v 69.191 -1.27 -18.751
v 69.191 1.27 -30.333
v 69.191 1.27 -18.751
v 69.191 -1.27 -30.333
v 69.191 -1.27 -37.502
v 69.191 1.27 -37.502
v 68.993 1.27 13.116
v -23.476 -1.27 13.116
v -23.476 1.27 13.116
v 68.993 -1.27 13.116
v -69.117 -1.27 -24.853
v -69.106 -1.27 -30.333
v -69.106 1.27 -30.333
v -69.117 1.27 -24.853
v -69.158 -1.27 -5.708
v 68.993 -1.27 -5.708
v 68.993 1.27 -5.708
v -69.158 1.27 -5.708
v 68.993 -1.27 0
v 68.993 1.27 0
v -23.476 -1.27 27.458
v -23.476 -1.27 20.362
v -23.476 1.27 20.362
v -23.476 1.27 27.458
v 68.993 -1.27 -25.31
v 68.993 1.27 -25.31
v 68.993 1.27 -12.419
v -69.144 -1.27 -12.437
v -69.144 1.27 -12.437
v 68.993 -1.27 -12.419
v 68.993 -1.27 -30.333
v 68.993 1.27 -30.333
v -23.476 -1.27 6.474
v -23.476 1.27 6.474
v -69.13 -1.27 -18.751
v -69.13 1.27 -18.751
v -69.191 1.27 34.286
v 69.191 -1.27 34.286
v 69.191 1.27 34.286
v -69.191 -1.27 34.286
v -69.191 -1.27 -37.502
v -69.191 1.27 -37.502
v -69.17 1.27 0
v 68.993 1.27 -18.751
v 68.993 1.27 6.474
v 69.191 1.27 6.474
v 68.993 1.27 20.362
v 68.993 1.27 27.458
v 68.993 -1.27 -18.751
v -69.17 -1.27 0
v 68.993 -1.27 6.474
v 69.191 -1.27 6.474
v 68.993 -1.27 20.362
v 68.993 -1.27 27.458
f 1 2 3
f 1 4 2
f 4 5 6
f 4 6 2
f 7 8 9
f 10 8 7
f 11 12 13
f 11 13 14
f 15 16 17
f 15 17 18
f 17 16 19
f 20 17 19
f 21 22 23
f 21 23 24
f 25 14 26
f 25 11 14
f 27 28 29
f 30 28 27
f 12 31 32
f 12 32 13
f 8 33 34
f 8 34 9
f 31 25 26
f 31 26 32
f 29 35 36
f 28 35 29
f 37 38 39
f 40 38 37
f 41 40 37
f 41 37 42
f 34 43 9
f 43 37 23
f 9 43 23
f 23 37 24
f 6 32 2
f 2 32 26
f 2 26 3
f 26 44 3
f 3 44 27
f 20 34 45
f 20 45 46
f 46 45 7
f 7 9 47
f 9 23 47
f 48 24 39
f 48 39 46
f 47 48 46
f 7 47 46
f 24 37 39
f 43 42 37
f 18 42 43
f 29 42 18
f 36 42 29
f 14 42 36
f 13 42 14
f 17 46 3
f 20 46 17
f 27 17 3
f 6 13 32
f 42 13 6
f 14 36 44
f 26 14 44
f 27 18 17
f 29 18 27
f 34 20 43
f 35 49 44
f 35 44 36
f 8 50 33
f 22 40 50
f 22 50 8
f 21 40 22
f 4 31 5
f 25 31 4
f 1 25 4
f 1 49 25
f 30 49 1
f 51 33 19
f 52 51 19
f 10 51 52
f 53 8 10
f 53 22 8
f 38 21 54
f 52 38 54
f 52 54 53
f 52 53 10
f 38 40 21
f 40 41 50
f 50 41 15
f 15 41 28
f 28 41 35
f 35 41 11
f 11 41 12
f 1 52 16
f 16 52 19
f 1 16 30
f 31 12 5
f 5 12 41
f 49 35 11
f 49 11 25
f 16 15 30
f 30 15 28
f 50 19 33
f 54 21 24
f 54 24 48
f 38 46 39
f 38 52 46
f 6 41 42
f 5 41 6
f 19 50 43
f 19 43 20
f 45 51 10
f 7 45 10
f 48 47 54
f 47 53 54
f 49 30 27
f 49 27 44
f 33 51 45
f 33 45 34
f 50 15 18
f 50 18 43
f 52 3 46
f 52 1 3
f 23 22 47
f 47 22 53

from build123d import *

# Parameters (mm, degrees)
F0_W     = 0.1980072791
F0_H     = 7.1694856525
F0_W_2   = 92.4687646329
F0_H_2   = 6.8283765789
F0_H_3   = 6.473645713
F0_H_4   = 5.7075782395
F0_H_5   = 7.0958843866
F0_H_6   = 7.2461878881
F0_H_7   = 6.6423406824
F1_DEPTH = 1.27


# Not quite as in the source:
# - a feature names something its author has since deleted; it is built from what else it names


with BuildPart() as f1:
    # F0 (on Front) → F1 (new body, symmetric)
    with BuildSketch(Plane.XZ):
        Polygon((-69.1910094554, 0), (-69.1910094554, -37.5021121278), (-69.0906792879, -37.5021121278), (-69.1058018093, -30.3326264753), (-69.1173589099, -24.8534827961), (-69.130230695, -18.7510560639), (-69.1435495608, -12.4366714017), (-69.1577431668, -5.7075782395), (-69.1697821021, 0), align=None)
        Polygon((-69.1058018093, -30.3326264753), (-69.0906792879, -37.5021121278), (68.9930021763, -37.5021121278), (68.9930021763, -30.3326264753), align=None)
        Polygon((-69.1910094554, 34.2864352491), (-69.1910094554, 0), (-69.1697821021, 0), (-23.4757624567, 0), (-23.4757624567, 6.473645713), (-23.4757624567, 13.1159863955), (-23.4757624567, 20.3621742836), (-23.4757624567, 27.4580586702), (-23.4757624567, 34.2864352491), align=None)
        with Locations((69.0920058158, -33.9173693016)):
            Rectangle(F0_W, F0_H)
        Polygon((68.9930021763, -25.3095924286), (68.9930021763, -30.3326264753), (69.1910094554, -30.3326264753), (69.1910094554, -25.3102463479), align=None)
        Polygon((-69.130230695, -18.7510560639), (-69.1173589099, -24.8534827961), (68.9930021763, -25.3095924286), (68.9930021763, -18.7510560639), align=None)
        with Locations((22.7586198598, 30.8722469596)):
            Rectangle(F0_W_2, F0_H_2)
        with Locations((22.7586198598, 3.2368228565)):
            Rectangle(F0_W_2, F0_H_3)
        Polygon((68.9930021763, -5.7075782395), (-69.1577431668, -5.7075782395), (-69.1435495608, -12.4366714017), (68.9930021763, -12.4186396162), align=None)
        Polygon((68.9930021763, -18.7510560639), (68.9930021763, -25.3095924286), (69.1910094554, -25.3102463479), (69.1910094554, -18.7510560639), align=None)
        with Locations((69.0920058158, 30.8722469596)):
            Rectangle(F0_W, F0_H_2)
        with Locations((69.0920058158, 3.2368228565)):
            Rectangle(F0_W, F0_H_3)
        with Locations((69.0920058158, -2.8537891197)):
            Rectangle(F0_W, F0_H_4)
        Polygon((69.1910094554, -5.7075782395), (68.9930021763, -5.7075782395), (68.9930021763, -12.4186396162), (69.1910094554, -12.4186137691), align=None)
        Polygon((68.9930021763, -12.4186396162), (68.9930021763, -18.7510560639), (69.1910094554, -18.7510560639), (69.1910094554, -12.4186137691), align=None)
        with Locations((69.0920058158, 23.9101164769)):
            Rectangle(F0_W, F0_H_5)
        with Locations((22.7586198598, 16.7390803395)):
            Rectangle(F0_W_2, F0_H_6)
        with Locations((69.0920058158, 9.7948160542)):
            Rectangle(F0_W, F0_H_7)
        with Locations((69.0920058158, 16.7390803395)):
            Rectangle(F0_W, F0_H_6)
    extrude(amount=F1_DEPTH, both=True)


solid = f1.part
